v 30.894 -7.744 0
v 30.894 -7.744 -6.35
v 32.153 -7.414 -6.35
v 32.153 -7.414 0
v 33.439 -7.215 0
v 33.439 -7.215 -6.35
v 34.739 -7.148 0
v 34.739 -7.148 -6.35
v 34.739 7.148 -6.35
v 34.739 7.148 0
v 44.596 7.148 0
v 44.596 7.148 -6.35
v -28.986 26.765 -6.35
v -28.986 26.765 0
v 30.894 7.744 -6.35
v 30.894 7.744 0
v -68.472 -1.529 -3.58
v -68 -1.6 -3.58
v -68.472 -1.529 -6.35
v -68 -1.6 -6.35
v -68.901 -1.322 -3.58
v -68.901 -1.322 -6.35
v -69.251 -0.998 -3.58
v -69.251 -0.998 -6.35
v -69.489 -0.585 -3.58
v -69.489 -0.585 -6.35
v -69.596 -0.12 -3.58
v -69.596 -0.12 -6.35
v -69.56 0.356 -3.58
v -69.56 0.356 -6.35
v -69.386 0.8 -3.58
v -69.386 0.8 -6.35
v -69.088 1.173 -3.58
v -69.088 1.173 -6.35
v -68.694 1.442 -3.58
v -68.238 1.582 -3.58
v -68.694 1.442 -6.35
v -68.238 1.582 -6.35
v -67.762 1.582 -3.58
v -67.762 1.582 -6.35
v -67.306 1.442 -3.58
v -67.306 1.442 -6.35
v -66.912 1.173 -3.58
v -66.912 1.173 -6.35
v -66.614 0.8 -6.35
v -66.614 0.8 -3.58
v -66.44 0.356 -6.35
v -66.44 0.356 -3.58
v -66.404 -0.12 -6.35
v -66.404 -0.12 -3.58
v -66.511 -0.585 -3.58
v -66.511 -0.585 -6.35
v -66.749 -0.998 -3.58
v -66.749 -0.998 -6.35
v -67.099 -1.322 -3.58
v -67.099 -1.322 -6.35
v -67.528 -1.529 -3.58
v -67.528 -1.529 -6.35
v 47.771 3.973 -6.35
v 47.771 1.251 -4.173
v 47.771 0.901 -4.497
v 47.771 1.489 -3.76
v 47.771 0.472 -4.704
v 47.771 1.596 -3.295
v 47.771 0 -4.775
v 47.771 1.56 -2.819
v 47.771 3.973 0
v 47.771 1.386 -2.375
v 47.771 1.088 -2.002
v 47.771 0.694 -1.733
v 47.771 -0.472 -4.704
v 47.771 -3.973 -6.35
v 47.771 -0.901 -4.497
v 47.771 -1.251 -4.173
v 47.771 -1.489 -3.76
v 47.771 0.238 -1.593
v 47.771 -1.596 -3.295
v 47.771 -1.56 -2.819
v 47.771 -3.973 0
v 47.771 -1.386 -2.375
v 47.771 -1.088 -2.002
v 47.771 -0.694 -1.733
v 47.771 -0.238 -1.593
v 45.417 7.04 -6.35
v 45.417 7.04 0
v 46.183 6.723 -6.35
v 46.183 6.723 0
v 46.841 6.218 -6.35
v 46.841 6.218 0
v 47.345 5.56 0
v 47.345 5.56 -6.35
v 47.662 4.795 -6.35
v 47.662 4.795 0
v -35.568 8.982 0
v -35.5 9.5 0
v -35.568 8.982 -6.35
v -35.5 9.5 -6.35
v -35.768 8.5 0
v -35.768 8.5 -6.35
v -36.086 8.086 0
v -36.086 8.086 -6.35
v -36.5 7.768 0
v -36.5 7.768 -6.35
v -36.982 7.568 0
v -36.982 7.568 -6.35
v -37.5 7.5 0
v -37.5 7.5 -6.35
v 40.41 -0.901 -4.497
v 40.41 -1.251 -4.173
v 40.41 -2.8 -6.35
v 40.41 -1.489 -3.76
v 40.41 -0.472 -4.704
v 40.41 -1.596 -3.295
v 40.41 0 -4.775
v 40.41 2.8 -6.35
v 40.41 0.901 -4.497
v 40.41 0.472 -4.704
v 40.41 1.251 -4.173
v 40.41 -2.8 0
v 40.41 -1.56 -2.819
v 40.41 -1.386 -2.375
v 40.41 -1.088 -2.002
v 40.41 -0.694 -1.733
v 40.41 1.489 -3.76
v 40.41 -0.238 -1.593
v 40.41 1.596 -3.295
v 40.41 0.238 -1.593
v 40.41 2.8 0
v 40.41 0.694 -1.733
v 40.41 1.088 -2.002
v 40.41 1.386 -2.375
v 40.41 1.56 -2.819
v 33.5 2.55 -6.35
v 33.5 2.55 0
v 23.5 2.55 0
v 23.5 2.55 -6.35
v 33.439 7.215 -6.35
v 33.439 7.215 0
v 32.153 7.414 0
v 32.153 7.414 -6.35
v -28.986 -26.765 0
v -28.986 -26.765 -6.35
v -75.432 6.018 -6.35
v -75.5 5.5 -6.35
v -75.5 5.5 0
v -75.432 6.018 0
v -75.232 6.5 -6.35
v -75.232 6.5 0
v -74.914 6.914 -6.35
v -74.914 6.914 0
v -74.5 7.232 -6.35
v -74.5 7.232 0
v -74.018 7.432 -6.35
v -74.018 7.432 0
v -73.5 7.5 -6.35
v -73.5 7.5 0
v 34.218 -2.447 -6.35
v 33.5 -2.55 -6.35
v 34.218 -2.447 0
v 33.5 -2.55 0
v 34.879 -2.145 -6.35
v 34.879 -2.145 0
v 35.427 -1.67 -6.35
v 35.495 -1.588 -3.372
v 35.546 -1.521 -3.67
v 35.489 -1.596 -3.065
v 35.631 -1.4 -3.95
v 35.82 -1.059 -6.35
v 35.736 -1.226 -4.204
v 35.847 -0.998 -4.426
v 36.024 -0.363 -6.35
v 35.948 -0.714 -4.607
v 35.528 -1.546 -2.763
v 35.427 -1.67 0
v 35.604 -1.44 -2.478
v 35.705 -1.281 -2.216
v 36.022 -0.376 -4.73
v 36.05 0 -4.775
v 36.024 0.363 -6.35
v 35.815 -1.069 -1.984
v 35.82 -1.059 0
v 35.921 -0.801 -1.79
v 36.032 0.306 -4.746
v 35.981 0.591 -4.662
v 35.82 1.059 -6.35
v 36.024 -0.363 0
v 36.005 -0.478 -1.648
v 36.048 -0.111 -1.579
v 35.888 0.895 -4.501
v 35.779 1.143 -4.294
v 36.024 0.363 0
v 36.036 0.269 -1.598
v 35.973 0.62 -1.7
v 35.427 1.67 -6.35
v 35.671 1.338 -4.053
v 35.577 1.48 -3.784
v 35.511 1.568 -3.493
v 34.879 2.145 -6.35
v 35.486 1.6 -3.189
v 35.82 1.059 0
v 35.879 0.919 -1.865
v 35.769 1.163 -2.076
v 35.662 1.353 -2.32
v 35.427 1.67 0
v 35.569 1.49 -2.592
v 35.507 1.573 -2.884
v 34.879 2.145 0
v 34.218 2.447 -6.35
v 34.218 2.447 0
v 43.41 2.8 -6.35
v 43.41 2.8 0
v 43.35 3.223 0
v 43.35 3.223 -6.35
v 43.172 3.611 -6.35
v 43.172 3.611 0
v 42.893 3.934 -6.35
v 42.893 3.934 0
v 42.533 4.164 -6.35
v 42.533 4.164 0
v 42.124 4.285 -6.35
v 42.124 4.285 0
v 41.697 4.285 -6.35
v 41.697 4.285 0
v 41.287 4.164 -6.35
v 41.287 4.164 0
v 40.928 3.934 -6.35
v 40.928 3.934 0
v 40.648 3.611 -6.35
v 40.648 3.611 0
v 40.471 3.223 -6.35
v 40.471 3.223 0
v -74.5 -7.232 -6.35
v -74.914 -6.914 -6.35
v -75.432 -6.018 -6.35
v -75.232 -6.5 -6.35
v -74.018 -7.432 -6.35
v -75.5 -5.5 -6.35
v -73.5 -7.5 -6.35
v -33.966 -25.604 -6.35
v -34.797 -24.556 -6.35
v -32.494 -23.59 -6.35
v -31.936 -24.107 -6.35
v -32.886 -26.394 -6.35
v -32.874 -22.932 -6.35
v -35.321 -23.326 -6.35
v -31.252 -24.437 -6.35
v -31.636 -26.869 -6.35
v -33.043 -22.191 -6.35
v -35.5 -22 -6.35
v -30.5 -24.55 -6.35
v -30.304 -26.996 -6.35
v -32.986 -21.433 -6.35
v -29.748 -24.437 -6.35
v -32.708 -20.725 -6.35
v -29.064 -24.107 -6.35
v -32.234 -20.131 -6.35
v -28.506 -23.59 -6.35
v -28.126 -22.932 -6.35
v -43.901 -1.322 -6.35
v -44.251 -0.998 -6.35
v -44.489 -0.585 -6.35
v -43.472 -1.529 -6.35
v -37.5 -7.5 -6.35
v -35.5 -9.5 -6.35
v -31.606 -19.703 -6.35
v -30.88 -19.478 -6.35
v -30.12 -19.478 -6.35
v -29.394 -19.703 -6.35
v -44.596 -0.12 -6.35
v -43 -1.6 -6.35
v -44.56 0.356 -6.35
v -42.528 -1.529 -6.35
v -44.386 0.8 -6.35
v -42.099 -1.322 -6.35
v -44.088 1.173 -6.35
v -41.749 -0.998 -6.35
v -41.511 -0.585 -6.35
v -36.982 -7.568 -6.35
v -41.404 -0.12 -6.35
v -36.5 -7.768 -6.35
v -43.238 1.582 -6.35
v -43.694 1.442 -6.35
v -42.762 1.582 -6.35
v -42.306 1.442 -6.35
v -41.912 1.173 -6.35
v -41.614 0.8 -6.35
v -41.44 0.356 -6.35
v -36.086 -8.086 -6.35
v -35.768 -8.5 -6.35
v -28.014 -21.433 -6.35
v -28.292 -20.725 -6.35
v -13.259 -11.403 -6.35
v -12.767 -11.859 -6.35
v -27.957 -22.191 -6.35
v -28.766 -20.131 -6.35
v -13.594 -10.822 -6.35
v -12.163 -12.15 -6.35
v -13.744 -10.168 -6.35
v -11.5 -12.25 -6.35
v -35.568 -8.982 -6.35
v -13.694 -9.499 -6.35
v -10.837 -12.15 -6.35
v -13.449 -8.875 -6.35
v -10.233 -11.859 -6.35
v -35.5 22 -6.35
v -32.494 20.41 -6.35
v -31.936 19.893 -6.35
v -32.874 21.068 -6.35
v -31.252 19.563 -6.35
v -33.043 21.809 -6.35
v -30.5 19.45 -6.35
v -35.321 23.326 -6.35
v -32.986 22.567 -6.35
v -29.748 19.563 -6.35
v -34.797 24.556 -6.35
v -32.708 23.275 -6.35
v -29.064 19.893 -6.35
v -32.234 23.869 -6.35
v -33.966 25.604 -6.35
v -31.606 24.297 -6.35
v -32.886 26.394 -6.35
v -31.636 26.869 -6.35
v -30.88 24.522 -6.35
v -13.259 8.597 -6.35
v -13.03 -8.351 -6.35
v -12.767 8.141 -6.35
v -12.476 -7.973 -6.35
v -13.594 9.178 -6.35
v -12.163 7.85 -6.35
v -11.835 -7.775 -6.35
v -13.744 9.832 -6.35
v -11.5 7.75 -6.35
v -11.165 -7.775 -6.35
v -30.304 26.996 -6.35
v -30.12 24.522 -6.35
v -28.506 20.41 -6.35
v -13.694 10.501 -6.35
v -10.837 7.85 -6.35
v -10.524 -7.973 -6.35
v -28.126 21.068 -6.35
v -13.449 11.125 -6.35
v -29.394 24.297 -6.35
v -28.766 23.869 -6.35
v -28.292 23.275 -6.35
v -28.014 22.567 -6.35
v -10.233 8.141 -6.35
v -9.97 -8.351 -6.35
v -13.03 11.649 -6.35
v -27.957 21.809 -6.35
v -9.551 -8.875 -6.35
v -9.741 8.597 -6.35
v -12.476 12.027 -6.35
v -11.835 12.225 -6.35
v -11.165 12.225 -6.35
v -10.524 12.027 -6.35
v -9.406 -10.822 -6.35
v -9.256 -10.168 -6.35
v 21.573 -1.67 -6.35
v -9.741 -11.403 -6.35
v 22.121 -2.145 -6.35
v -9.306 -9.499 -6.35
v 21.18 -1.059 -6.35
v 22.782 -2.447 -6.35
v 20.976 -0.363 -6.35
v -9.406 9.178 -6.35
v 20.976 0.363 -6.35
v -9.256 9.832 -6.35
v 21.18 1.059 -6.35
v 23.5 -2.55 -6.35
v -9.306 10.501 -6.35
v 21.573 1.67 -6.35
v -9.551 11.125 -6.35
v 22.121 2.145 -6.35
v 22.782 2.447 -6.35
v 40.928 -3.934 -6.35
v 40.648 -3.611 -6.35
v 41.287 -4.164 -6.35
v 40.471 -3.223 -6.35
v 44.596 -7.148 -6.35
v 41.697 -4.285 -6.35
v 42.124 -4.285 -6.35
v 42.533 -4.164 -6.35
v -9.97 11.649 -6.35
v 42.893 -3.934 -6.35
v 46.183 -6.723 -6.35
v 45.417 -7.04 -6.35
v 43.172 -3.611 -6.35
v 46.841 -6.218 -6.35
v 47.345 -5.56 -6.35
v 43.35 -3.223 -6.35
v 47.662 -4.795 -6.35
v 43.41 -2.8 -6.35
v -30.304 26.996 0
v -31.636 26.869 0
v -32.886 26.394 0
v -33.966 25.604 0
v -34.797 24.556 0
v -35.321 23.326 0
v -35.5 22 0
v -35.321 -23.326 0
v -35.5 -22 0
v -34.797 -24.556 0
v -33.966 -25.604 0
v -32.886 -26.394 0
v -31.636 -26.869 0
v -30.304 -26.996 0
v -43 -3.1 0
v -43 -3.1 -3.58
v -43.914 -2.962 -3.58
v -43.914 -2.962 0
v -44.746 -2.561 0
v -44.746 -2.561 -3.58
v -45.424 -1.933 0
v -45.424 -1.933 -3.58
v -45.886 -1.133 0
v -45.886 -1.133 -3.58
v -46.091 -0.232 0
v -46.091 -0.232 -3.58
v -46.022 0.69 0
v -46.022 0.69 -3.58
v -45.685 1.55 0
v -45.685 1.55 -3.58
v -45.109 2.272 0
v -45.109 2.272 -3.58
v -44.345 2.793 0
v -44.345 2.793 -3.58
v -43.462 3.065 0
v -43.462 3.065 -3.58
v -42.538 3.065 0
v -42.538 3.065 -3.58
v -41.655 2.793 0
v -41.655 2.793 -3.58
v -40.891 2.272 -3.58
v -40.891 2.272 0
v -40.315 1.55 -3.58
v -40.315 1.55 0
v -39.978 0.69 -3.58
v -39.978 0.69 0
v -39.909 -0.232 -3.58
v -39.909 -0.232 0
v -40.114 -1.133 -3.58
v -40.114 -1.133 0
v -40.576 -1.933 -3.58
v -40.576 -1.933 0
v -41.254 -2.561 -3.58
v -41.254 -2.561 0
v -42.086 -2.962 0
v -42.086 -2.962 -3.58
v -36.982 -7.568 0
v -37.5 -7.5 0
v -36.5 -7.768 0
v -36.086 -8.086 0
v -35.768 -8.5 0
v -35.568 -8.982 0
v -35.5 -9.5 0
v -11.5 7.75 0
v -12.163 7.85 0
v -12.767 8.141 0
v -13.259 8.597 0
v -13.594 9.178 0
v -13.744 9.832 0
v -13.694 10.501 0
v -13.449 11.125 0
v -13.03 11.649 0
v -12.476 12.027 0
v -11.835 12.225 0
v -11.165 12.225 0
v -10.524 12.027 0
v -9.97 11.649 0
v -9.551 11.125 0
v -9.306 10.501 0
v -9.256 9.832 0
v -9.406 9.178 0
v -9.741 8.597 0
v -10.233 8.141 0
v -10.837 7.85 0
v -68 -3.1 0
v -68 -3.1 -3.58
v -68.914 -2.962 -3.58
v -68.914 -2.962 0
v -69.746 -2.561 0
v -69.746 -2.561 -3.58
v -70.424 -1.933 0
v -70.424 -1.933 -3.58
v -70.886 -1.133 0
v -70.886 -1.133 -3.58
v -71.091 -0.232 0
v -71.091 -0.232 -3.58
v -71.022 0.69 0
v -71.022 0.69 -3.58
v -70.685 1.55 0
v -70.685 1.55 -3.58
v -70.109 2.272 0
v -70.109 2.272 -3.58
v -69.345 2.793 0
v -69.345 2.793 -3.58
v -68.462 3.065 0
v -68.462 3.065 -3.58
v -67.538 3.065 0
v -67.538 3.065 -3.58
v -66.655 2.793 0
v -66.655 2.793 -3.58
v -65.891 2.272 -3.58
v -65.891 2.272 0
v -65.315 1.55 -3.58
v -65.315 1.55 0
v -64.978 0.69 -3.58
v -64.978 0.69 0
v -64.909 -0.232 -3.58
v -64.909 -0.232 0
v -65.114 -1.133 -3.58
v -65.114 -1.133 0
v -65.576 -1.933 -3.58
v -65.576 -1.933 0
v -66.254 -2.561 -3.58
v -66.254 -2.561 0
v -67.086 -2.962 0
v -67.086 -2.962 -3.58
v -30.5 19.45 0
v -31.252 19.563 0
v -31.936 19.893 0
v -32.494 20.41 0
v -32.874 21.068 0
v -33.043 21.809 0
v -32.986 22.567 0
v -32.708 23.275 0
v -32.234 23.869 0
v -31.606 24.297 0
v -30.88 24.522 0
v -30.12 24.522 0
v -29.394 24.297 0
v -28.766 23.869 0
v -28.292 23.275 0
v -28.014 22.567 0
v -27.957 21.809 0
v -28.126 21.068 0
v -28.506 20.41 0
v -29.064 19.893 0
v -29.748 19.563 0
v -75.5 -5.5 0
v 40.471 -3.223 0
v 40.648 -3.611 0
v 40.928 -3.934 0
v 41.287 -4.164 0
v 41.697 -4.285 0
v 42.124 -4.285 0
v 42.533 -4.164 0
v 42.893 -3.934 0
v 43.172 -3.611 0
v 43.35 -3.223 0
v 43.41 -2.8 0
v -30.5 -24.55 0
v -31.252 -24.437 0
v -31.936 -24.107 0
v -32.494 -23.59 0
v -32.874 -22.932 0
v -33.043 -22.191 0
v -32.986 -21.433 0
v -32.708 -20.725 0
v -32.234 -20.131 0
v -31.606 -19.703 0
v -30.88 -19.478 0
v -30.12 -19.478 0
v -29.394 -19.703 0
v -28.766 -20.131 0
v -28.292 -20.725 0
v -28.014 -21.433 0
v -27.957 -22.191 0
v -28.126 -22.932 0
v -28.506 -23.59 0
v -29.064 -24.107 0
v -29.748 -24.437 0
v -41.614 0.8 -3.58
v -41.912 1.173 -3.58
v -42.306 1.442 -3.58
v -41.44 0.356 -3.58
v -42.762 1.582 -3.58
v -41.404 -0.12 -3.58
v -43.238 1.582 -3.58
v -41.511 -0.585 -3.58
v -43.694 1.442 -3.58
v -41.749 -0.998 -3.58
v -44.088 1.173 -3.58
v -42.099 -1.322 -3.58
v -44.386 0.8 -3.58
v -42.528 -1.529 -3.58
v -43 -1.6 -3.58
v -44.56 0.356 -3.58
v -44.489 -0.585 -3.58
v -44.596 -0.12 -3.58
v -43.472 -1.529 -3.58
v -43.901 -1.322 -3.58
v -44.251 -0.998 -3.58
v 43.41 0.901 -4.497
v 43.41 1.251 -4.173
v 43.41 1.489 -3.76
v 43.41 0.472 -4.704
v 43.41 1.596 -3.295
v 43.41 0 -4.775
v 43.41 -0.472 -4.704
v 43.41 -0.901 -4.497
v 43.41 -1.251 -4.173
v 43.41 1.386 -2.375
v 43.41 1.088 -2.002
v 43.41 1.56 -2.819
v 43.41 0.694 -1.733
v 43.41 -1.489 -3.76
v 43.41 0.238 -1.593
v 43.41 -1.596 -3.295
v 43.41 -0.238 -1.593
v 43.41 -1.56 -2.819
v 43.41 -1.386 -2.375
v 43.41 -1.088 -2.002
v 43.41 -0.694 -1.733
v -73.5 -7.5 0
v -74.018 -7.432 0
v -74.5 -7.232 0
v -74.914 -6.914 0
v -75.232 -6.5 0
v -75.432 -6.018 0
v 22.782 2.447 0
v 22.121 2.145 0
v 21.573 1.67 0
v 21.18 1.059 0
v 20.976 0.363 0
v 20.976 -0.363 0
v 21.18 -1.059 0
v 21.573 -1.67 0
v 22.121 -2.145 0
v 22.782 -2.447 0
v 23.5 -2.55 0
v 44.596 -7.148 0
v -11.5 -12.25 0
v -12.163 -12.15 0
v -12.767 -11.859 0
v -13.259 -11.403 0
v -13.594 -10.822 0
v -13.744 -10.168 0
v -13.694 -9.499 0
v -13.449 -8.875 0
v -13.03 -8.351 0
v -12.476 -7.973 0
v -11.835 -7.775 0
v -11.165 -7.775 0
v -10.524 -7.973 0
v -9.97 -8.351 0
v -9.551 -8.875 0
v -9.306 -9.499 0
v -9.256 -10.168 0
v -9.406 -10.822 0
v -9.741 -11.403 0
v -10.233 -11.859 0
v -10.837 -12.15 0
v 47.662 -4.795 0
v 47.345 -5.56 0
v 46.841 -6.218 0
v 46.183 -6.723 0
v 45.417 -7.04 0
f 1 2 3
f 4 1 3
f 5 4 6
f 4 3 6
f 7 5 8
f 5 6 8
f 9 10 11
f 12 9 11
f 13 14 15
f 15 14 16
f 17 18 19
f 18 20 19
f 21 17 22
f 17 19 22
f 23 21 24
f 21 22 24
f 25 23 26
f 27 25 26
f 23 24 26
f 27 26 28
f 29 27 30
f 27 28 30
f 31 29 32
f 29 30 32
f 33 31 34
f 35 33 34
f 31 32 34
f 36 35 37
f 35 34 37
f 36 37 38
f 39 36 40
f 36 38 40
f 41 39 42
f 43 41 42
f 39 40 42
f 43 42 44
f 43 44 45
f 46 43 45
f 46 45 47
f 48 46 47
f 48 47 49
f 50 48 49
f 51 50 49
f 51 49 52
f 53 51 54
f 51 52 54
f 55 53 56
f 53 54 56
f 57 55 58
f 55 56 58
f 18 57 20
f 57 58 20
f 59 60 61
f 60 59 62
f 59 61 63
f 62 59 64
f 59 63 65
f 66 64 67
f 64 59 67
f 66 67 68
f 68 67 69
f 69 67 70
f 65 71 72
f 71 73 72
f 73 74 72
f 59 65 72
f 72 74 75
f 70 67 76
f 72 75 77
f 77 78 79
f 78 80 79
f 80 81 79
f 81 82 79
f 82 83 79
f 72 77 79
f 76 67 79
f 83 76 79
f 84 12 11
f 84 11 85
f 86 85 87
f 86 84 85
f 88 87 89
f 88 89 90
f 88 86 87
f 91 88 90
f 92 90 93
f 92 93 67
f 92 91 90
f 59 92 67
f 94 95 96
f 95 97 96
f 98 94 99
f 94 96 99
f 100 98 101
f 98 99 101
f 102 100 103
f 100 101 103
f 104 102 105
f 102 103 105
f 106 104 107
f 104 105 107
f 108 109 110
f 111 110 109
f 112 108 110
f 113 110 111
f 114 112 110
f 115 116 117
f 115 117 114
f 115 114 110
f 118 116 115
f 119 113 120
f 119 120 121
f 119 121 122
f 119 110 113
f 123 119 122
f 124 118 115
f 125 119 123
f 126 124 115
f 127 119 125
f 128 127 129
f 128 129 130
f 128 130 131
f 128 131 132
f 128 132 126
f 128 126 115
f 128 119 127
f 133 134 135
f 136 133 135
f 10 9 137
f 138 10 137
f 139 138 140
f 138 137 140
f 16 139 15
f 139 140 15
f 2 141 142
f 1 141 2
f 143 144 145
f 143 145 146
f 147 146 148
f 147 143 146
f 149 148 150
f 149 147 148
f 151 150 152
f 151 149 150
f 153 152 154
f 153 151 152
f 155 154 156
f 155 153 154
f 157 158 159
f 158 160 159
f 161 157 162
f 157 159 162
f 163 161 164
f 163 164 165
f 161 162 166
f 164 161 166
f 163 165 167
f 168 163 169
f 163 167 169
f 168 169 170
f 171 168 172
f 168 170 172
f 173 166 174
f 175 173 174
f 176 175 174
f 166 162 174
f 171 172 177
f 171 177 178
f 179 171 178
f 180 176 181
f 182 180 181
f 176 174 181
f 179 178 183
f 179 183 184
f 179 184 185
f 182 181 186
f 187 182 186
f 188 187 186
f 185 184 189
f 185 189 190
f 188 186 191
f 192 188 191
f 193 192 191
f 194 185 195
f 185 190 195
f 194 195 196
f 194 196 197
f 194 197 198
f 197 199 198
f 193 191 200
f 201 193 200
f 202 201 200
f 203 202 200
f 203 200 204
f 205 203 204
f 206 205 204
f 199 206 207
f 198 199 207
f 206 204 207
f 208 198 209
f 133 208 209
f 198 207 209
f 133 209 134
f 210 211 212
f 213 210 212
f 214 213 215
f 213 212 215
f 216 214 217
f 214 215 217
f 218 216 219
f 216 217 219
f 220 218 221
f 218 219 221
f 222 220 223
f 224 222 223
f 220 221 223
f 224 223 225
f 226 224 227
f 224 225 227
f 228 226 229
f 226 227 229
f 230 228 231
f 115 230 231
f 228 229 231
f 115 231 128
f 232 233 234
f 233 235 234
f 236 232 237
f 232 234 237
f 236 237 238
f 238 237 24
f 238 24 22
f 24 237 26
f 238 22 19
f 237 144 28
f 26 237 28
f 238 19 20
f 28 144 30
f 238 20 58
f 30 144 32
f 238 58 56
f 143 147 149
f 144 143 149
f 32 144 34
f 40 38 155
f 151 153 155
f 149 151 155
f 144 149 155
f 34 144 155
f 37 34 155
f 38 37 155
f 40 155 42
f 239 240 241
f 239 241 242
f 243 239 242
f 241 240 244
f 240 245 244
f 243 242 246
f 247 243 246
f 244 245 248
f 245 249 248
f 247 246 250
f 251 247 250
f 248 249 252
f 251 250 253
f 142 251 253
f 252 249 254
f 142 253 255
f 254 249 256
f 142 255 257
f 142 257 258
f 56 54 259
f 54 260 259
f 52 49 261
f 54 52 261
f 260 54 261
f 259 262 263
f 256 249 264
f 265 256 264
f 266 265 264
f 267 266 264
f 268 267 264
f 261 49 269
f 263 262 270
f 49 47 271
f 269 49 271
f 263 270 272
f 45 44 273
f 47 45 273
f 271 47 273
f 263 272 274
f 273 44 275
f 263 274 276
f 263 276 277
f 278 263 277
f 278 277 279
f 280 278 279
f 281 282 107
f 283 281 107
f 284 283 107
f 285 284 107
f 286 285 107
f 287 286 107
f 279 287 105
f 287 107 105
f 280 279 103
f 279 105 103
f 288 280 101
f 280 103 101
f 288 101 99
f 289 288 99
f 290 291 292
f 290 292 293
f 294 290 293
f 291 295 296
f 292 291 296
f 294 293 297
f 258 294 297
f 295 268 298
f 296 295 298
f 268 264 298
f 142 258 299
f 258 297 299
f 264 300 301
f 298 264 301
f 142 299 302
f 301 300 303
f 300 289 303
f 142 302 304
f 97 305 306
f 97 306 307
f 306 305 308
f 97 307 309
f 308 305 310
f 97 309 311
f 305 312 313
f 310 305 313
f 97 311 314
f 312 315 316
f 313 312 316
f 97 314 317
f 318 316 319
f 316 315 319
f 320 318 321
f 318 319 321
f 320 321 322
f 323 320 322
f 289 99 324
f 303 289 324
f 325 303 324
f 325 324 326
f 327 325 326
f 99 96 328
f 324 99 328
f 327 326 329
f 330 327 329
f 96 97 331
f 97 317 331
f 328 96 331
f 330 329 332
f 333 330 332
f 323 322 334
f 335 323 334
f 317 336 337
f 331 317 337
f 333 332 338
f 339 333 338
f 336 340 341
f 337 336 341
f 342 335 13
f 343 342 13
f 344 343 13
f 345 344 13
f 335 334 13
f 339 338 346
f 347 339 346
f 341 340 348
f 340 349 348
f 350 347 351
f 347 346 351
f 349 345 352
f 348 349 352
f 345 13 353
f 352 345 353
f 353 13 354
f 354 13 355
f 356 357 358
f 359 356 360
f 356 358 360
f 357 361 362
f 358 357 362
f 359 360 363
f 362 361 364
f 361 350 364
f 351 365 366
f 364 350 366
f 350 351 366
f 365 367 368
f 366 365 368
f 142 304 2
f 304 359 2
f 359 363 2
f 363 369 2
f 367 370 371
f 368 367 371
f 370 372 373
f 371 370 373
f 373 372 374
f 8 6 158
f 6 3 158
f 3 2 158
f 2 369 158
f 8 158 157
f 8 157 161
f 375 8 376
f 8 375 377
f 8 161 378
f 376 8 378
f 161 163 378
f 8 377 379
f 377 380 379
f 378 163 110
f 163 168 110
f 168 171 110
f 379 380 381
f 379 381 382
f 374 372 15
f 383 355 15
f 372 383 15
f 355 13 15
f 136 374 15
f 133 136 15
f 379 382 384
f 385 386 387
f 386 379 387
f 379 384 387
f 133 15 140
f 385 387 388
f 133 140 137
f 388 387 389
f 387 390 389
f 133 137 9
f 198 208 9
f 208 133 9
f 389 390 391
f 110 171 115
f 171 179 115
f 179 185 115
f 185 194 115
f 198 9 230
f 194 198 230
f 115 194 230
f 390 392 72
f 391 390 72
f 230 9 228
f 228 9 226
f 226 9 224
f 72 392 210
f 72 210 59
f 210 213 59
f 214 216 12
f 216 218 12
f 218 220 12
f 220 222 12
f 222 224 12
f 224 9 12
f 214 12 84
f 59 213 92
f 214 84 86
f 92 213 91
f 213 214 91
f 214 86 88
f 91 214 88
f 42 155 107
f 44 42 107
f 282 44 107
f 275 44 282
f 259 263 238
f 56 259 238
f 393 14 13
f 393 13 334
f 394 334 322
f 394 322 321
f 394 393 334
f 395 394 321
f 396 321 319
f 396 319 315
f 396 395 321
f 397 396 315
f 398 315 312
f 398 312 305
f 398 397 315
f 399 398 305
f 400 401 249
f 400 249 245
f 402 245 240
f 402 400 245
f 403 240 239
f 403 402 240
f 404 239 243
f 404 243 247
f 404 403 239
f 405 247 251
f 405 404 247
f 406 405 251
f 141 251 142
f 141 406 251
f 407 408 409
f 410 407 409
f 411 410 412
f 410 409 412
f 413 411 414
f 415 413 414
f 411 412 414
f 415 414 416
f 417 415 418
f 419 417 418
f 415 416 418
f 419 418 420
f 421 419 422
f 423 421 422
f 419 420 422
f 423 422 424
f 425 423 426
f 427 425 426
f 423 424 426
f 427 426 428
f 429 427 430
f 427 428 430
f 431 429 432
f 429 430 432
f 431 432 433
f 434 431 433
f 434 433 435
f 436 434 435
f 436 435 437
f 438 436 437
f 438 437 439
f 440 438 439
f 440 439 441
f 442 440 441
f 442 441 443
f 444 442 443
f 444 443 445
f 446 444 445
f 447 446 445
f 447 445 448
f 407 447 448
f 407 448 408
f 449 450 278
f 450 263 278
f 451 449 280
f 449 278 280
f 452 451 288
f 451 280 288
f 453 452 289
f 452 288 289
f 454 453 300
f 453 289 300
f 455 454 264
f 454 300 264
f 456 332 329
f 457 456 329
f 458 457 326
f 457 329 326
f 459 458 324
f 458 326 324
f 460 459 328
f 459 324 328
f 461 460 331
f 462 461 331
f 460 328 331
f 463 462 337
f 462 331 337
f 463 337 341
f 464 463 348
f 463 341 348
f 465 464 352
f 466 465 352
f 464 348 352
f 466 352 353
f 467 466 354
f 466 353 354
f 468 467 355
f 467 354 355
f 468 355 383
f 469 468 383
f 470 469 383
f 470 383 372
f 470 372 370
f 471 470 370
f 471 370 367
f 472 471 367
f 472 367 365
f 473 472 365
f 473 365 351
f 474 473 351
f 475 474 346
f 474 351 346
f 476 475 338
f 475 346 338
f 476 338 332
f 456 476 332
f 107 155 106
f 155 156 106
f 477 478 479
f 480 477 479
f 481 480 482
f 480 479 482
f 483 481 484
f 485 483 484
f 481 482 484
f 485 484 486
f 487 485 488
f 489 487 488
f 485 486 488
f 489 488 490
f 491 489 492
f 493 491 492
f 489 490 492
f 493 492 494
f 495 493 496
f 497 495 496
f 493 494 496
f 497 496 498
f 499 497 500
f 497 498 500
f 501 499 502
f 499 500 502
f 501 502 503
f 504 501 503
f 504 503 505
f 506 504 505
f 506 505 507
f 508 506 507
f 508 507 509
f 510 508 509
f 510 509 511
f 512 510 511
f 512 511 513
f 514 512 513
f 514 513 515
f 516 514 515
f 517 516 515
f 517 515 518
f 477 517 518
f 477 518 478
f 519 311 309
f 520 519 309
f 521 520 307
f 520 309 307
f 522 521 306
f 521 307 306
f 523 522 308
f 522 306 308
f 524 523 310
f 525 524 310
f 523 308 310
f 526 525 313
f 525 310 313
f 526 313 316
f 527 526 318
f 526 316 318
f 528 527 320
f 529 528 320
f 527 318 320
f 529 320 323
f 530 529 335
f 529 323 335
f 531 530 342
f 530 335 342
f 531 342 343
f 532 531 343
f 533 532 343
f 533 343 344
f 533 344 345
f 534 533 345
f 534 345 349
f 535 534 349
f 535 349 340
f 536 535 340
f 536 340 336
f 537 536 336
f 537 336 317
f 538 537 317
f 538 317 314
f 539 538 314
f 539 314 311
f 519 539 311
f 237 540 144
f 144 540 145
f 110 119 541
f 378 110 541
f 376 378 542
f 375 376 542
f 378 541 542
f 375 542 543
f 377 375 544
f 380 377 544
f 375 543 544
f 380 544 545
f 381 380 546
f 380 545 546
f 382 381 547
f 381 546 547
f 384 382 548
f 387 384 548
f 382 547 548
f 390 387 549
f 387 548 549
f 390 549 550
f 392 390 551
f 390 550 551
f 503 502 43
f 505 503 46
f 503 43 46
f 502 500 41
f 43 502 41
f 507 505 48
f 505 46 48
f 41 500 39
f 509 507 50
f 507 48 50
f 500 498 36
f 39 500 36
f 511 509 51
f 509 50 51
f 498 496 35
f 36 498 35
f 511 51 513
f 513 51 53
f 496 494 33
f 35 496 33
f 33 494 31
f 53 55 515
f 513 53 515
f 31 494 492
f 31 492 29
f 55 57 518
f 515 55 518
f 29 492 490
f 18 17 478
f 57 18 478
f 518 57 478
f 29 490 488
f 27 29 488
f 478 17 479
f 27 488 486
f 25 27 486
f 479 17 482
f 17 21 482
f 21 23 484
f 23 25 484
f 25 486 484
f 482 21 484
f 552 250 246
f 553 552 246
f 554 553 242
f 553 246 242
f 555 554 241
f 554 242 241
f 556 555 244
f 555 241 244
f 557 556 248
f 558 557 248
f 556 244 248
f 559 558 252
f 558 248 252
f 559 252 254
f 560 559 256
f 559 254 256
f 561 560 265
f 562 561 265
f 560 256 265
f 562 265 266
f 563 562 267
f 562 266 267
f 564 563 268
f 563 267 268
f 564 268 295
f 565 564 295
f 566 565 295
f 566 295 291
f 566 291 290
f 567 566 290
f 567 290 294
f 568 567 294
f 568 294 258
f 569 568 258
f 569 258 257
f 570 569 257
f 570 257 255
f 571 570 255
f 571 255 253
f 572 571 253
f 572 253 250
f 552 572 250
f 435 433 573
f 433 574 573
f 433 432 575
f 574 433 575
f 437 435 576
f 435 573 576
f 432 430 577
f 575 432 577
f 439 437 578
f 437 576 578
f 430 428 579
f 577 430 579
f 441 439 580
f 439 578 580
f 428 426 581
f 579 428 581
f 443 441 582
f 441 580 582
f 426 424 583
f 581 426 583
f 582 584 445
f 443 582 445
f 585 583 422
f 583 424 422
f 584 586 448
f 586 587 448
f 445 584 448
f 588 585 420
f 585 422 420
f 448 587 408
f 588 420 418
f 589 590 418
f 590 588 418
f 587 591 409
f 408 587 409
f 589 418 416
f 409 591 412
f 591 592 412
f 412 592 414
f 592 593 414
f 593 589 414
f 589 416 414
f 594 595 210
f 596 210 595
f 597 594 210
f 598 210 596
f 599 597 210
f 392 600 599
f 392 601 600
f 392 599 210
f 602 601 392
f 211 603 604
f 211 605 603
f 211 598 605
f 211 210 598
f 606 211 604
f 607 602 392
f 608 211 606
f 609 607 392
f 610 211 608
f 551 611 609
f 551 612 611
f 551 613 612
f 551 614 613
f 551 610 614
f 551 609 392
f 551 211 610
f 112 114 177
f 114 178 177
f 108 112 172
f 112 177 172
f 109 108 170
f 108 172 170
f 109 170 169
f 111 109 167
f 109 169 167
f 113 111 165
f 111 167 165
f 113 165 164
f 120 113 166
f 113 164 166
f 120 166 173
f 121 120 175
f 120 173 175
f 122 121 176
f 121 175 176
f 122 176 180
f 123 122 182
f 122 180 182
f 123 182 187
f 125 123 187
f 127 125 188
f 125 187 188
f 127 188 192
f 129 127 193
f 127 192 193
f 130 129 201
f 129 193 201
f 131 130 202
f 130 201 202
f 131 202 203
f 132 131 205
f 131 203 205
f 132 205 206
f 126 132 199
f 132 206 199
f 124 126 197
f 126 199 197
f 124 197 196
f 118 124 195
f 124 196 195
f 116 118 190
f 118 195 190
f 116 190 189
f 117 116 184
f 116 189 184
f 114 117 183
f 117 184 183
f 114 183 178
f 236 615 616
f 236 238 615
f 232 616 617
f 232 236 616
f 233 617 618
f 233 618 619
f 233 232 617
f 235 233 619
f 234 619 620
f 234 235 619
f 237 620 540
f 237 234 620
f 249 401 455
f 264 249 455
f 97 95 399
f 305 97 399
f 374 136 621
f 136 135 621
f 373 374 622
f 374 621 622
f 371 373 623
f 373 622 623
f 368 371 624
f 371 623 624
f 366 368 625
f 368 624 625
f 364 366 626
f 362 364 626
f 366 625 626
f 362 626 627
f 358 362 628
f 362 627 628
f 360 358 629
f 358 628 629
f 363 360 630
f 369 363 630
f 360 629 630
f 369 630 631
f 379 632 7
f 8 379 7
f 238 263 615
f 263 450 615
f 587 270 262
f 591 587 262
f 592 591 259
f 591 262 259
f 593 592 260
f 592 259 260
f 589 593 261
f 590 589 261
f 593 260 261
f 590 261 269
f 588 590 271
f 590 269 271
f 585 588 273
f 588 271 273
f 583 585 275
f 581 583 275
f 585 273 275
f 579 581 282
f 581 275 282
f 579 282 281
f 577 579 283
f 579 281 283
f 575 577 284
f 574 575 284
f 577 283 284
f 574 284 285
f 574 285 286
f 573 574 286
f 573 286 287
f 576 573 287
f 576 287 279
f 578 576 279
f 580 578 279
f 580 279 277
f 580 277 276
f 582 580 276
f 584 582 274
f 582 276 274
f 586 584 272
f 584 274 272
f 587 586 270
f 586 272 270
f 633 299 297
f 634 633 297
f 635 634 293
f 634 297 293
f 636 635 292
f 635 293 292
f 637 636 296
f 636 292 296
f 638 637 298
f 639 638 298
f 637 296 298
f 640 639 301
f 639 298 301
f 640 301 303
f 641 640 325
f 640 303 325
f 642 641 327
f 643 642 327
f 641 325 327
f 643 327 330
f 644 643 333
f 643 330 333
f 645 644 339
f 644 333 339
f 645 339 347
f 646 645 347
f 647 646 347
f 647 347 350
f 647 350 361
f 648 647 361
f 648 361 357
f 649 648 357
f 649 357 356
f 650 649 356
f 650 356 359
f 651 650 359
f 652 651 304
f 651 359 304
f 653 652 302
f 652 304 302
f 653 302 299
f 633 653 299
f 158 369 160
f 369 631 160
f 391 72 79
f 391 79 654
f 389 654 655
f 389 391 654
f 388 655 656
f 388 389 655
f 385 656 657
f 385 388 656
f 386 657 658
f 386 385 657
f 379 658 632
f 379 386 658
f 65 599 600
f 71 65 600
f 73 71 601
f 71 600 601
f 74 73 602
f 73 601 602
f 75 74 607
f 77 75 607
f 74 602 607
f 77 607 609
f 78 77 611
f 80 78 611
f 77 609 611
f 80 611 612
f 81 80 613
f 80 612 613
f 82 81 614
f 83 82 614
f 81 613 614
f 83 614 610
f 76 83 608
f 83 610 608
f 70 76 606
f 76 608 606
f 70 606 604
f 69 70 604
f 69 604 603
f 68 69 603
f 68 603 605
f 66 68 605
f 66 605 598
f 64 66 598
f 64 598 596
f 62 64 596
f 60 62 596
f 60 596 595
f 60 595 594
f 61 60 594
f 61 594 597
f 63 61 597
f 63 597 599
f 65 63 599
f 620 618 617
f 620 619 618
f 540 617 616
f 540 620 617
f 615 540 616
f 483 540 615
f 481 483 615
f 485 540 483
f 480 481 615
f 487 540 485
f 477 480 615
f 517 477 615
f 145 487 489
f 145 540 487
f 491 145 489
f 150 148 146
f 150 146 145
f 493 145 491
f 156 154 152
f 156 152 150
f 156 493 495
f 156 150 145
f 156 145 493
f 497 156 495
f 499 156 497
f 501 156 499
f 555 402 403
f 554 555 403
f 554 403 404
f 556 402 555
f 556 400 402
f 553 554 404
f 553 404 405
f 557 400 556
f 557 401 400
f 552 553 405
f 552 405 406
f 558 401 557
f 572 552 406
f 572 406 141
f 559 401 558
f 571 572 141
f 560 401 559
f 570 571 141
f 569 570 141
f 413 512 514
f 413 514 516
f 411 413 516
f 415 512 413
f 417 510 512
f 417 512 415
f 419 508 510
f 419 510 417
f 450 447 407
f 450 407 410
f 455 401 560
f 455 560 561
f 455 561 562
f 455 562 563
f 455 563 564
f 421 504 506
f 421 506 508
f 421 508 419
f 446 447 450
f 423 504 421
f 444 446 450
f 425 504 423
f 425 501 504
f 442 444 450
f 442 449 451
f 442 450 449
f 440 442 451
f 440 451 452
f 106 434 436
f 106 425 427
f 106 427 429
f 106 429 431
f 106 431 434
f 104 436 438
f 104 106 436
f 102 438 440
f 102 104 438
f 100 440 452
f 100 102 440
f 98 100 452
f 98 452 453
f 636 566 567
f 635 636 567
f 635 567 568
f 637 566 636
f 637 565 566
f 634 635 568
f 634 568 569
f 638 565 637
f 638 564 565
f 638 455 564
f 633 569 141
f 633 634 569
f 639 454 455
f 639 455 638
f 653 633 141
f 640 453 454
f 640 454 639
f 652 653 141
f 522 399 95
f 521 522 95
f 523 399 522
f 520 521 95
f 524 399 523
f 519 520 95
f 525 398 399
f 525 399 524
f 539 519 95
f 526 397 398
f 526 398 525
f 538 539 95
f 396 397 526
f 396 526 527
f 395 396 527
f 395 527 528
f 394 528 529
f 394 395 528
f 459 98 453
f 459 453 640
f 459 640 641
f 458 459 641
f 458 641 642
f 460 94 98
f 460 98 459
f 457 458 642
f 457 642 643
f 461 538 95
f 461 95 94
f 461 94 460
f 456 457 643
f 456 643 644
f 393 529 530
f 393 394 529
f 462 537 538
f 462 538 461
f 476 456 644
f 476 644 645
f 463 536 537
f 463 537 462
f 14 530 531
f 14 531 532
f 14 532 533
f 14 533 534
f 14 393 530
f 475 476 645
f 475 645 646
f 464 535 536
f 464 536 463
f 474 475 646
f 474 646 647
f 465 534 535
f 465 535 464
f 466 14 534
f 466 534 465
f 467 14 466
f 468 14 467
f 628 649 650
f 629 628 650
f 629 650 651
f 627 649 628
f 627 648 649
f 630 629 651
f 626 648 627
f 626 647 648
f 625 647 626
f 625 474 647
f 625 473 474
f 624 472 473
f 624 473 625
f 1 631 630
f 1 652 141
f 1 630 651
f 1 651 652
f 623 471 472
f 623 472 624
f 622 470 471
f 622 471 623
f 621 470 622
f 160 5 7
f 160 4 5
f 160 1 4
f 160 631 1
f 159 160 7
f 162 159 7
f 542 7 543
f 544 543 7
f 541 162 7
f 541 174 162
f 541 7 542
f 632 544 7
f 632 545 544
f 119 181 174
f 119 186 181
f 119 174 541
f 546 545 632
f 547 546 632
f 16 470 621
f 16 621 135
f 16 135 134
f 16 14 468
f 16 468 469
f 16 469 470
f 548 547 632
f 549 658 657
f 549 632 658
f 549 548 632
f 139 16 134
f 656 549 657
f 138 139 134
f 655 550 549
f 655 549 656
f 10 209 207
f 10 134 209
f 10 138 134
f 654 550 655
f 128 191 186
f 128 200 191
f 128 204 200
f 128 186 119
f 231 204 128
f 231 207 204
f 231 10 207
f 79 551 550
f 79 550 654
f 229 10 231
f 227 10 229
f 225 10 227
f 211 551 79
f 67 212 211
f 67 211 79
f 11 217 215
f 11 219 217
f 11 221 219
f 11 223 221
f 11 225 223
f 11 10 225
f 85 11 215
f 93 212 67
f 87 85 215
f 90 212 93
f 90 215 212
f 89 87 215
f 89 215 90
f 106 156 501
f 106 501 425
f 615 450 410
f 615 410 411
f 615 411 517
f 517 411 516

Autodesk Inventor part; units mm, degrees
ref_plane "YZ Plane" through (0, 0, 0) normal (1, 0, 0) x (0, 1, 0)
ref_plane "XY Plane" through (0, 0, 0) normal (0, 0, 1) x (1, 0, 0)
sketch "Sketch1" plane through (0, 0, 0) normal (0, 0, 1) x (1, 0, 0)
  line L0 (-20, 150) -> (20, 150) construction
  line L1 (20, 150) -> (20, -150) construction
  line L2 (20, -150) -> (-20, -150) construction
  line L3 (-20, -150) -> (-20, 150) construction
  circle A0 centre (-30.5, 22) radius 11.95 construction
  circle A1 centre (-30.5, -22) radius 11.95 construction
  circle A2 centre (30.5, 0) radius 11.95 construction
  line L4 (42.45, 4.056) -> (42.45, -13.1126) construction
  circle A3 centre (30.5, 0) radius 7.5
  circle A4 centre (-30.5, 22) radius 5
  circle A5 centre (-30.5, -22) radius 5
  line L5 (-35.5, 3.8118) -> (-35.5, -3.8118) construction
  line L6 (0, 150) -> (0, -150) construction
  line L7 (-20, -108) -> (-20, -150) construction
  line L8 (-20, 150) -> (-20, 108) construction
  line L9 (-75.5, 7.5) -> (-35.5, 7.5)
  line L10 (-35.5, 7.5) -> (-35.5, -7.5)
  line L11 (-35.5, -7.5) -> (-75.5, -7.5)
  line L12 (-75.5, -7.5) -> (-75.5, 7.5)
  circle A6 centre (0, -150) radius 6 construction
  circle A7 centre (-11.5, -10) radius 4.5
  circle A8 centre (0, -150) radius 7
  line L13 (-7, -150) -> (-7, -10)
  line L14 (-11.5, 5.5) -> (-180, 5.5)
  line L15 (-11.5, -5.5) -> (-180, -5.5)
  line L16 (-185.5, -10) -> (-35.5, -10) construction
  line L17 (-35.5, -10) -> (-35.5, 10) construction
  line L18 (-35.5, 10) -> (-185.5, 10) construction
  line L19 (-185.5, 10) -> (-185.5, -10) construction
  circle A9 centre (-180, 0) radius 4.5 construction
  circle A10 centre (-180, 0) radius 5.5
  circle A11 centre (-11.5, -10) radius 2.5 construction
  line L20 (-35.5, -22) -> (-35.5, 22)
  line L21 (-28.9863, -26.7654) -> (32.7706, -7.148)
  line L22 (-28.9863, 26.7654) -> (32.7706, 7.148)
  line L23 (-20, 0) -> (0, 0)
  circle A12 centre (0, 150) radius 4.5 construction
  circle A13 centre (0, 150) radius 7
  line L24 (-7, 150) -> (-7, 10)
  circle A14 centre (-11.5, 10) radius 4.5
  line L25 (7, -150) -> (7, 150)
  point P0 (20, 0)
  point P1 (-29.8, 0)
  point P2 (-35.4948, -21.7719)
  point P3 (-35.4948, 21.7719)
  point P4 (-28.5008, 26.5829)
  point P5 (32.6594, 7.1824)
  point P6 (32.6594, -7.1824)
  point P7 (-28.5008, -26.5829)
  point P8 (-35.5, 0)
  point P9 (-68, 0)
  point P10 (-43, 0)
  point P11 (-75.5, 0)
  point P12 (-35.5, 0)
  point P13 (-95.75, -5.5)
  point P14 (-185.5, 0)
  dimension "d0" = 40
  dimension "d1" = 300
  dimension "d2" = 23.9
  dimension "d3" = 22
  dimension "d4" = 22
  dimension "d6" = 30.5
  dimension "d7" = 30.5
  dimension "d12" = 15
  dimension "d38" = 10
  dimension "d42" = 15
  dimension "d43" = 40
  dimension "d44" = 25
  dimension "d45" = 7.5
  dimension "d46" = 7.5
  dimension "d48" = 12
  dimension "d49" = 9
  dimension "d51" = 1
  dimension "d53" = 20
  dimension "d55" = 9
  dimension "d56" = 1
  dimension "d60" = 150
  dimension "d74" = 9
  dimension "d75" = 2.5
  dimension "d76" = 9
extrude "Extrusion1" add sketch "Sketch1" against normal blind 6.35 contours A3 | A3 L21 L25 L22 | L25 L21 L13 A7 L15 L10 L14 A14 L24 L22 | L24 A14 L14 L10 L20 A4 L22 | L21 A5 L20 L10 L15 A7 L13 | A4 | A14 | A7 | A5 | L10 L14 L12 L9 | L10 L15 L12 L14 | L10 L11 L12 L15
hole "Hole1" at (-30.5, 22, 0) at (-30.5, -22, 0) at (30.5, 0, 0) direction (0, 0, -1) diameter 5.1 end through all
hole "Hole2" at (-43, 0, 0) at (-68, 0, 0) direction (0, 0, -1) diameter 3.2 end through all counterbore diameter 6.2 counterbore depth 3.58
fillet "Fillet1" radius 2 4 edges at (-75.5, 7.5, -3.175) (-75.5, -7.5, -3.175) (-35.5, -7.5, -3.175) (-35.5, 7.5, -3.175)
hole "Hole4" at (-11.5, -10, 0) at (-11.5, 10, 0) direction (0, 0, -1) diameter 4.5 end through all
sketch "Sketch3" plane through (0, 0, 0) normal (0, 0, 1) x (1, 0, 0)
  circle A0 centre (-11.5, -10) radius 2.25 projected
  circle A1 centre (-11.5, 10) radius 2.25 projected
  circle A2 centre (-43, 0) radius 3.1 projected
  circle A3 centre (-68, 0) radius 3.1 projected
  circle A4 centre (-30.5, 22) radius 2.55 projected
  circle A5 centre (-30.5, -22) radius 2.55 projected
  arc A6 (-75.5, -5.5) -> (-73.5, -7.5) centre (-73.5, -5.5) ccw projected
  line L0 (-73.5, -7.5) -> (-37.5, -7.5) projected
  arc A7 (-35.5, -9.5) -> (-37.5, -7.5) centre (-37.5, -9.5) ccw projected
  line L1 (-35.5, -9.5) -> (-35.5, -22) projected
  arc A8 (-35.5, -22) -> (-28.9863, -26.7654) centre (-30.5, -22) ccw projected
  line L2 (-28.9863, -26.7654) -> (32.7706, -7.148) projected
  arc A9 (32.7706, -7.148) -> (32.7706, 7.148) centre (30.5, 0) ccw projected
  line L3 (32.7706, 7.148) -> (-28.9863, 26.7654) projected
  arc A10 (-28.9863, 26.7654) -> (-35.5, 22) centre (-30.5, 22) ccw projected
  line L4 (-35.5, 22) -> (-35.5, 9.5) projected
  arc A11 (-37.5, 7.5) -> (-35.5, 9.5) centre (-37.5, 9.5) ccw projected
  line L5 (-37.5, 7.5) -> (-73.5, 7.5) projected
  arc A12 (-73.5, 7.5) -> (-75.5, 5.5) centre (-73.5, 5.5) ccw projected
  line L6 (-75.5, 5.5) -> (-75.5, -5.5) projected
  point P0 (0, 0)
sketch "Sketch4" plane through (0, 0, 0) normal (0, 0, 1) x (1, 0, 0)
  circle A0 centre (33.5, 0) radius 2.55 construction
  line L0 (33.5, 0) -> (23.5, 0) construction
  line L1 (33.5, 2.55) -> (23.5, 2.55)
  line L2 (23.5, -2.55) -> (33.5, -2.55)
  arc A1 (33.5, -2.55) -> (33.5, 2.55) centre (33.5, 0) ccw
  arc A2 (23.5, 2.55) -> (23.5, -2.55) centre (23.5, 0) ccw
  circle A3 centre (30.5, 0) radius 2.55 projected
  point P0 (0, 0)
  point P1 (28.5, 0)
  point P2 (33.5, 2.55)
  dimension "d78" = 10
  dimension "d97" = 3
extrude "Extrusion2" cut sketch "Sketch4" against normal blind 25.4
sketch "Sketch5" plane through (0, 0, 0) normal (0, 0, 1) x (1, 0, 0)
  line L0 (32.7706, 7.148) -> (-28.9863, 26.7654) projected
  line L1 (32.7706, 7.148) -> (47.7706, 7.148)
  line L2 (47.7706, 7.148) -> (47.7706, -7.148)
  line L3 (47.7706, -7.148) -> (32.7706, -7.148)
  line L4 (-28.9863, -26.7654) -> (32.7706, -7.148) projected
  line L5 (40.4103, 2.8) -> (43.4103, 2.8)
  line L6 (43.4103, 2.8) -> (43.4103, -2.8)
  line L7 (43.4103, -2.8) -> (40.4103, -2.8)
  line L8 (40.4103, -2.8) -> (40.4103, 2.8)
  line L9 (36.05, 2.2796) -> (36.05, -2.3678) construction
  arc A0 (32.7706, -7.148) -> (32.7706, 7.148) centre (30.5, 0) ccw projected
  circle A1 centre (41.9103, 2.8) radius 1.5
  circle A2 centre (41.9103, -2.8) radius 1.5
  arc A3 (33.5, -2.55) -> (33.5, 2.55) centre (33.5, 0) ccw projected
  point P0 (0, 0)
  point P1 (32.7098, 0)
  point P2 (40.4103, 0)
  point P3 (43.4103, 2.8)
  point P4 (40.4103, 2.8)
  dimension "d81" = 3
  dimension "d82" = 5.6
  dimension "d83" = 15
  dimension "d84" = 4.3603
  dimension "d85" = 4.3603
extrude "Extrusion3" add sketch "Sketch5" against normal up to surface (6.35 mm away)
sketch "Sketch6" plane through (47.7706, -7.148, 0) normal (1, 0, 0) x (0, 0, -1)
  line L0 (6.35, 14.2961) -> (6.35, 0) projected
  line L1 (0, 14.2961) -> (6.35, 14.2961) projected
  line L2 (0, 0) -> (0, 14.2961) projected
  line L3 (0, 0) -> (6.35, 0) projected
  point P0 (0, 7.148)
  point P1 (3.175, 7.148)
  point P2 (0, 7.148)
  point P3 (3.175, 14.2961)
hole "Hole5" at (47.7706, 0, -3.175) direction (-1, 0, 0) diameter 3.2 depth 25.4 tip angle 118
fillet "Fillet2" radius 12.7 2 edges at (32.7706, 7.148, -3.175) (32.7706, -7.148, -3.175)
fillet "Fillet3" radius 3.175 2 edges at (47.7706, -7.148, -3.175) (47.7706, 7.148, -3.175)
sketch "Sketch7" plane through (0, 0, -6.35) normal (0, 0, -1) x (-1, 0, 0)
  arc A0 (-43.4103, -2.8) -> (-40.4103, -2.8) centre (-41.9103, -2.8) ccw projected
  line L0 (-43.4103, -2.8) -> (-43.4103, 2.8) projected
  arc A1 (-40.4103, 2.8) -> (-43.4103, 2.8) centre (-41.9103, 2.8) ccw projected
  line L1 (-40.4103, 2.8) -> (-40.4103, -2.8) projected
  line L2 (-33.5, 2.55) -> (-23.5, 2.55) projected
  arc A2 (-23.5, -2.55) -> (-23.5, 2.55) centre (-23.5, 0) ccw projected
  line L3 (-23.5, -2.55) -> (-33.5, -2.55) projected
  circle A3 centre (30.5, 22) radius 2.55 projected
  circle A4 centre (30.5, -22) radius 2.55 projected
  circle A5 centre (68, 0) radius 1.6 projected
  circle A6 centre (43, 0) radius 1.6 projected
  arc A7 (-44.5956, 7.148) -> (-47.7706, 3.973) centre (-44.5956, 3.973) ccw projected
  line L4 (-47.7706, 3.973) -> (-47.7706, -3.973) projected
  arc A8 (-47.7706, -3.973) -> (-44.5956, -7.148) centre (-44.5956, -3.973) ccw projected
  line L5 (-44.5956, -7.148) -> (-34.7392, -7.148) projected
  arc A9 (-30.8944, -7.744) -> (-34.7392, -7.148) centre (-34.7392, -19.848) ccw projected
  line L6 (-30.8944, -7.744) -> (28.9863, -26.7654) projected
  arc A10 (28.9863, -26.7654) -> (35.5, -22) centre (30.5, -22) ccw projected
  line L7 (35.5, -22) -> (35.5, -9.5) projected
  arc A11 (37.5, -7.5) -> (35.5, -9.5) centre (37.5, -9.5) ccw projected
  line L8 (37.5, -7.5) -> (73.5, -7.5) projected
  arc A12 (73.5, -7.5) -> (75.5, -5.5) centre (73.5, -5.5) ccw projected
  line L9 (75.5, -5.5) -> (75.5, 5.5) projected
  arc A13 (75.5, 5.5) -> (73.5, 7.5) centre (73.5, 5.5) ccw projected
  line L10 (73.5, 7.5) -> (37.5, 7.5) projected
  arc A14 (35.5, 9.5) -> (37.5, 7.5) centre (37.5, 9.5) ccw projected
  line L11 (35.5, 9.5) -> (35.5, 22) projected
  arc A15 (35.5, 22) -> (28.9863, 26.7654) centre (30.5, 22) ccw projected
  line L12 (28.9863, 26.7654) -> (-30.8944, 7.744) projected
  arc A16 (-34.7392, 7.148) -> (-30.8944, 7.744) centre (-34.7392, 19.848) ccw projected
  line L13 (-34.7392, 7.148) -> (-44.5956, 7.148) projected
  circle A17 centre (11.5, 10) radius 2.25 projected
  circle A18 centre (11.5, -10) radius 2.25 projected
  arc A19 (-33.5, 2.55) -> (-33.5, -2.55) centre (-33.5, 0) ccw projected
  point P0 (0, 0)
equation "\"d4\" = d3"
equation "\"d7\" = d6"
equation "\"d46\" = d45"
equation "\"CAM_OFFSET\" = -0.508"
properties part number "XZ Plate"
